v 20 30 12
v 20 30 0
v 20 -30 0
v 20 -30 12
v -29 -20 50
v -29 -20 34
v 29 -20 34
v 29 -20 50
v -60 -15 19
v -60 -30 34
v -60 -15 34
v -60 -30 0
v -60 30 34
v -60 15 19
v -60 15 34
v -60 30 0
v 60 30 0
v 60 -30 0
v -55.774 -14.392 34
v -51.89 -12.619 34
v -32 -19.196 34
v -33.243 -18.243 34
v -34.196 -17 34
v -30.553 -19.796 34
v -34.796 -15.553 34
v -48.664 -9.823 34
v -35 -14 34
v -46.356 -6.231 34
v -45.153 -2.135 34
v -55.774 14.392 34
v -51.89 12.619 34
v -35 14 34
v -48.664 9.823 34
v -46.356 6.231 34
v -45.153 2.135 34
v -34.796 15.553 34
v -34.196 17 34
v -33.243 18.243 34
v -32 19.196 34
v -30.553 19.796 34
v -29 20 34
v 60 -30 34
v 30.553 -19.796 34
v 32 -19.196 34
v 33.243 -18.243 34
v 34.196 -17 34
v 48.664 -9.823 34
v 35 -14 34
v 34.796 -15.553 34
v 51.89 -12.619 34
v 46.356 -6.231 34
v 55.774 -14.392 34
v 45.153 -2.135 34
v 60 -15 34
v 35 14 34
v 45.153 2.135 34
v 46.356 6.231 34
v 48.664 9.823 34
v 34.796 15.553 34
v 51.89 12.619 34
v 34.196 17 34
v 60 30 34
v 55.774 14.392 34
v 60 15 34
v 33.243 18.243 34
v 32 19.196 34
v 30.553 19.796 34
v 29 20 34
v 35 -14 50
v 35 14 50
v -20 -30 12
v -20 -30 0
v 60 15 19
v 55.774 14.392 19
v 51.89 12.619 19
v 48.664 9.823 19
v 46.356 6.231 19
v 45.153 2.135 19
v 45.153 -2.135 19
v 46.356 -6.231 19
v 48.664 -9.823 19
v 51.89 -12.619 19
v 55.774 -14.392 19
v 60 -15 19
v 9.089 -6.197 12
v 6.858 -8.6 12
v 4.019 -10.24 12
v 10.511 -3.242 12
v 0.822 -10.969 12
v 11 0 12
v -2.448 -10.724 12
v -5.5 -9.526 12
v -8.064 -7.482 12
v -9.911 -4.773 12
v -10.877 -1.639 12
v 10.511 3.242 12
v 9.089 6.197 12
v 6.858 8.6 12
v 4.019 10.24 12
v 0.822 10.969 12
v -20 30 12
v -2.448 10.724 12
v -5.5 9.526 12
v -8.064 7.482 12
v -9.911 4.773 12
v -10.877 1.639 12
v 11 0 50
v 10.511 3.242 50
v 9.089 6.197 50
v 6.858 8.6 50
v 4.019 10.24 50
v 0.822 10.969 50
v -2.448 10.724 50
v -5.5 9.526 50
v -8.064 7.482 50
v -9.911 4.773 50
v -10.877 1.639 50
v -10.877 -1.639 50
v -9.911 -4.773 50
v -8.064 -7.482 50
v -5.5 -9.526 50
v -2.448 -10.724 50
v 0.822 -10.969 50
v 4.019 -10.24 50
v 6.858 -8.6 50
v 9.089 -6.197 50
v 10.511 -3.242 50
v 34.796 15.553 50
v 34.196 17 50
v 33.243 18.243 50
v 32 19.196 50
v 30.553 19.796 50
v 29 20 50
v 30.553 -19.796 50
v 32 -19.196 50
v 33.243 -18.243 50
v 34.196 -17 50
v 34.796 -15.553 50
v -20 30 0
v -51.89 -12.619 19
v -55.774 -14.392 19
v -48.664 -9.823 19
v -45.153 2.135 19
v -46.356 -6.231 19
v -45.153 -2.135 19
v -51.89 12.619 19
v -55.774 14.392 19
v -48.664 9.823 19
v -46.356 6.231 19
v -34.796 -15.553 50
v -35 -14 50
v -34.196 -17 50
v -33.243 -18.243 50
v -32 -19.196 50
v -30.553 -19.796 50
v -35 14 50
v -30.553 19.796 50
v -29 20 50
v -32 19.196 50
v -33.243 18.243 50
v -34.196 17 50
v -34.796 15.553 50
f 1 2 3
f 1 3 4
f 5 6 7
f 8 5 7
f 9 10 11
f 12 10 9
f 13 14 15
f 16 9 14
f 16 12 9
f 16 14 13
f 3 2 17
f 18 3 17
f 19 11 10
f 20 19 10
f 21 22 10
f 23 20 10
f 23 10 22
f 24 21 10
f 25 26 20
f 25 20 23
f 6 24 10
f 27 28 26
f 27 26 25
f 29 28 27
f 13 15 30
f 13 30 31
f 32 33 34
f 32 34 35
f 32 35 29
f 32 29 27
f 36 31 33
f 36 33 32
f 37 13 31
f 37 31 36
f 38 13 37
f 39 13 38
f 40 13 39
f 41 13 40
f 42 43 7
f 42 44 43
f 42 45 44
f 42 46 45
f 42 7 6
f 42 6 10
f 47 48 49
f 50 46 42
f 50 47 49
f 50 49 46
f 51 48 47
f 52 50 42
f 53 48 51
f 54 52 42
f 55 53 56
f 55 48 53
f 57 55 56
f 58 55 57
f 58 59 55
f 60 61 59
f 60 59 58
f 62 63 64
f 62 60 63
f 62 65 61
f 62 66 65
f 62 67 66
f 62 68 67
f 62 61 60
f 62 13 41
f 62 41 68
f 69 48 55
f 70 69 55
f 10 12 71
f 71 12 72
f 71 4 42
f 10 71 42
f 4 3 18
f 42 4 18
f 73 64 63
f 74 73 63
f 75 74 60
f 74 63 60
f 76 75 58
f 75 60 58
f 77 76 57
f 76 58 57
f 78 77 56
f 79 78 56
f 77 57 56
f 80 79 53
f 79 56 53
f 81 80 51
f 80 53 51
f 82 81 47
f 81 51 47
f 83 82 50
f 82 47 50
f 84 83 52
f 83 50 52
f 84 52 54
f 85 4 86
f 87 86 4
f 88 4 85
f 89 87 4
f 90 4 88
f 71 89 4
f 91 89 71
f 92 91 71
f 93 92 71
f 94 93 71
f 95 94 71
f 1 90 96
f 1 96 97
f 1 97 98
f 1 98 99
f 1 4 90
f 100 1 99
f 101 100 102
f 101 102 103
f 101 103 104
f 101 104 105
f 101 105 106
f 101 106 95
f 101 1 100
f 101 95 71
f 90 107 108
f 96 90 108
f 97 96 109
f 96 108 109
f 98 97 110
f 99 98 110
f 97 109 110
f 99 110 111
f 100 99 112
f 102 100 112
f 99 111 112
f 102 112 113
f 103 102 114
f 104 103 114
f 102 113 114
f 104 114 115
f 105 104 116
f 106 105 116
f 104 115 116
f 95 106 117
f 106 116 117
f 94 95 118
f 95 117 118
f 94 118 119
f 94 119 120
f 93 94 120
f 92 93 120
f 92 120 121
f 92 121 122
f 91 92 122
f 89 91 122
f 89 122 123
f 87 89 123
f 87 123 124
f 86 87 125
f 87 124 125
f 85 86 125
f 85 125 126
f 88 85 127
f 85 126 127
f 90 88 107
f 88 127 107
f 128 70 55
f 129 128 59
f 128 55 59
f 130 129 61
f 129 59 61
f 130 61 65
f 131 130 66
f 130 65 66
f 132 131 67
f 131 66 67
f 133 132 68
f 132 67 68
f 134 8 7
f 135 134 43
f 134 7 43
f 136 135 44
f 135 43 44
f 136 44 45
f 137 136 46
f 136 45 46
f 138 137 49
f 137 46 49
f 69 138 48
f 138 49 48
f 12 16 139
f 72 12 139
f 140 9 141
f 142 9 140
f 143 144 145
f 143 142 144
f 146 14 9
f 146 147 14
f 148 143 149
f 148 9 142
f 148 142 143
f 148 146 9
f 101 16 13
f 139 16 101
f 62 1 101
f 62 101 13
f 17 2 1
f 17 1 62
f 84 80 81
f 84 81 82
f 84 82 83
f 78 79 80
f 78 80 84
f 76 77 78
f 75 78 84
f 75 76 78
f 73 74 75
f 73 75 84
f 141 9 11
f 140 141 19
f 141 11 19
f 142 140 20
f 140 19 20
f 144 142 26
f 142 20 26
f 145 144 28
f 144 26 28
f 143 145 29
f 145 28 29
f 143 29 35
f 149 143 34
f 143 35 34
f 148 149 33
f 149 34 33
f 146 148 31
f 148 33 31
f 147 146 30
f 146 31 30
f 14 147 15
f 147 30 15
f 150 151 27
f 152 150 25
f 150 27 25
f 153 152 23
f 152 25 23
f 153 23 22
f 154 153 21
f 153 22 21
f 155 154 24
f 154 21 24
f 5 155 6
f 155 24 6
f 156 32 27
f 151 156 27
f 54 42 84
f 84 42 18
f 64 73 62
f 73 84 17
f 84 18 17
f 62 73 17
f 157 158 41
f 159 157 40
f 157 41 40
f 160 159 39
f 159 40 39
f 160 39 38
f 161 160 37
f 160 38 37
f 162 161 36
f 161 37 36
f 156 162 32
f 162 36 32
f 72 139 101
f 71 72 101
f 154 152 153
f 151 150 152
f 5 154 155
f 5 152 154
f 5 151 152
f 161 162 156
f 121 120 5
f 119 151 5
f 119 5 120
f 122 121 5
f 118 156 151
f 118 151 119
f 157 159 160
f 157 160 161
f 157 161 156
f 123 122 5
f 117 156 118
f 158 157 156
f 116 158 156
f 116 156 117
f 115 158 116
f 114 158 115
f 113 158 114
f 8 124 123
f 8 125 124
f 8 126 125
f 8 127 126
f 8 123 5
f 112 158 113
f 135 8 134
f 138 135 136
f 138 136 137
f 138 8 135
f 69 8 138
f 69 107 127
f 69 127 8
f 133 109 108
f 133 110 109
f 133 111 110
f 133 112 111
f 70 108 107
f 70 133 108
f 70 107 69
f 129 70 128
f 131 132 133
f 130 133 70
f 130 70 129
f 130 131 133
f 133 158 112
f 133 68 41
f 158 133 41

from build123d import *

# Parameters (mm, degrees)
F0_W     = 120
F0_H     = 60
F1_DEPTH = 34
F2_R     = 15
F3_DEPTH = 15
F5_DEPTH = 16
F6_R     = 11
F7_DEPTH = 38
F8_W     = 40
F8_H     = 12
F9_DEPTH = 60


with BuildPart() as f1:
    # F0 (on Top) → F1 (new body)
    with BuildSketch(Plane.XY):
        Rectangle(F0_W, F0_H)
    extrude(amount=F1_DEPTH)

    # F2 (on face) → F3 (cut)
    with BuildSketch(Plane.XY.offset(34)):
        with Locations((-60, 0)):
            Circle(F2_R)
        with Locations((60, 0)):
            Circle(F2_R)
    extrude(amount=-F3_DEPTH, mode=Mode.SUBTRACT)

    # F4 (on face) → F5 (join)
    with BuildSketch(Plane.XY.offset(34)):
        with BuildLine():
            ThreePointArc((-35, -14), (-33.242641, -18.242641), (-29, -20))
            Line((-29, -20), (29, -20))
            ThreePointArc((29, -20), (33.242641, -18.242641), (35, -14))
            Line((35, -14), (35, 14))
            ThreePointArc((35, 14), (33.242641, 18.242641), (29, 20))
            Line((29, 20), (-29, 20))
            ThreePointArc((-29, 20), (-33.242641, 18.242641), (-35, 14))
            Line((-35, 14), (-35, -14))
        make_face()
    extrude(amount=F5_DEPTH)

    # F6 (on face) → F7 (cut)
    with BuildSketch(Plane.XY.offset(50)):
        Circle(F6_R)
    extrude(amount=-F7_DEPTH, mode=Mode.SUBTRACT)

    # F8 (on face) → F9 (cut)
    with BuildSketch(Plane(origin=(0, 30, 0), x_dir=(-1, 0, 0), z_dir=(0, 1, 0))):
        with Locations((0, 6)):
            Rectangle(F8_W, F8_H)
    extrude(amount=-F9_DEPTH, mode=Mode.SUBTRACT)


solid = f1.part
